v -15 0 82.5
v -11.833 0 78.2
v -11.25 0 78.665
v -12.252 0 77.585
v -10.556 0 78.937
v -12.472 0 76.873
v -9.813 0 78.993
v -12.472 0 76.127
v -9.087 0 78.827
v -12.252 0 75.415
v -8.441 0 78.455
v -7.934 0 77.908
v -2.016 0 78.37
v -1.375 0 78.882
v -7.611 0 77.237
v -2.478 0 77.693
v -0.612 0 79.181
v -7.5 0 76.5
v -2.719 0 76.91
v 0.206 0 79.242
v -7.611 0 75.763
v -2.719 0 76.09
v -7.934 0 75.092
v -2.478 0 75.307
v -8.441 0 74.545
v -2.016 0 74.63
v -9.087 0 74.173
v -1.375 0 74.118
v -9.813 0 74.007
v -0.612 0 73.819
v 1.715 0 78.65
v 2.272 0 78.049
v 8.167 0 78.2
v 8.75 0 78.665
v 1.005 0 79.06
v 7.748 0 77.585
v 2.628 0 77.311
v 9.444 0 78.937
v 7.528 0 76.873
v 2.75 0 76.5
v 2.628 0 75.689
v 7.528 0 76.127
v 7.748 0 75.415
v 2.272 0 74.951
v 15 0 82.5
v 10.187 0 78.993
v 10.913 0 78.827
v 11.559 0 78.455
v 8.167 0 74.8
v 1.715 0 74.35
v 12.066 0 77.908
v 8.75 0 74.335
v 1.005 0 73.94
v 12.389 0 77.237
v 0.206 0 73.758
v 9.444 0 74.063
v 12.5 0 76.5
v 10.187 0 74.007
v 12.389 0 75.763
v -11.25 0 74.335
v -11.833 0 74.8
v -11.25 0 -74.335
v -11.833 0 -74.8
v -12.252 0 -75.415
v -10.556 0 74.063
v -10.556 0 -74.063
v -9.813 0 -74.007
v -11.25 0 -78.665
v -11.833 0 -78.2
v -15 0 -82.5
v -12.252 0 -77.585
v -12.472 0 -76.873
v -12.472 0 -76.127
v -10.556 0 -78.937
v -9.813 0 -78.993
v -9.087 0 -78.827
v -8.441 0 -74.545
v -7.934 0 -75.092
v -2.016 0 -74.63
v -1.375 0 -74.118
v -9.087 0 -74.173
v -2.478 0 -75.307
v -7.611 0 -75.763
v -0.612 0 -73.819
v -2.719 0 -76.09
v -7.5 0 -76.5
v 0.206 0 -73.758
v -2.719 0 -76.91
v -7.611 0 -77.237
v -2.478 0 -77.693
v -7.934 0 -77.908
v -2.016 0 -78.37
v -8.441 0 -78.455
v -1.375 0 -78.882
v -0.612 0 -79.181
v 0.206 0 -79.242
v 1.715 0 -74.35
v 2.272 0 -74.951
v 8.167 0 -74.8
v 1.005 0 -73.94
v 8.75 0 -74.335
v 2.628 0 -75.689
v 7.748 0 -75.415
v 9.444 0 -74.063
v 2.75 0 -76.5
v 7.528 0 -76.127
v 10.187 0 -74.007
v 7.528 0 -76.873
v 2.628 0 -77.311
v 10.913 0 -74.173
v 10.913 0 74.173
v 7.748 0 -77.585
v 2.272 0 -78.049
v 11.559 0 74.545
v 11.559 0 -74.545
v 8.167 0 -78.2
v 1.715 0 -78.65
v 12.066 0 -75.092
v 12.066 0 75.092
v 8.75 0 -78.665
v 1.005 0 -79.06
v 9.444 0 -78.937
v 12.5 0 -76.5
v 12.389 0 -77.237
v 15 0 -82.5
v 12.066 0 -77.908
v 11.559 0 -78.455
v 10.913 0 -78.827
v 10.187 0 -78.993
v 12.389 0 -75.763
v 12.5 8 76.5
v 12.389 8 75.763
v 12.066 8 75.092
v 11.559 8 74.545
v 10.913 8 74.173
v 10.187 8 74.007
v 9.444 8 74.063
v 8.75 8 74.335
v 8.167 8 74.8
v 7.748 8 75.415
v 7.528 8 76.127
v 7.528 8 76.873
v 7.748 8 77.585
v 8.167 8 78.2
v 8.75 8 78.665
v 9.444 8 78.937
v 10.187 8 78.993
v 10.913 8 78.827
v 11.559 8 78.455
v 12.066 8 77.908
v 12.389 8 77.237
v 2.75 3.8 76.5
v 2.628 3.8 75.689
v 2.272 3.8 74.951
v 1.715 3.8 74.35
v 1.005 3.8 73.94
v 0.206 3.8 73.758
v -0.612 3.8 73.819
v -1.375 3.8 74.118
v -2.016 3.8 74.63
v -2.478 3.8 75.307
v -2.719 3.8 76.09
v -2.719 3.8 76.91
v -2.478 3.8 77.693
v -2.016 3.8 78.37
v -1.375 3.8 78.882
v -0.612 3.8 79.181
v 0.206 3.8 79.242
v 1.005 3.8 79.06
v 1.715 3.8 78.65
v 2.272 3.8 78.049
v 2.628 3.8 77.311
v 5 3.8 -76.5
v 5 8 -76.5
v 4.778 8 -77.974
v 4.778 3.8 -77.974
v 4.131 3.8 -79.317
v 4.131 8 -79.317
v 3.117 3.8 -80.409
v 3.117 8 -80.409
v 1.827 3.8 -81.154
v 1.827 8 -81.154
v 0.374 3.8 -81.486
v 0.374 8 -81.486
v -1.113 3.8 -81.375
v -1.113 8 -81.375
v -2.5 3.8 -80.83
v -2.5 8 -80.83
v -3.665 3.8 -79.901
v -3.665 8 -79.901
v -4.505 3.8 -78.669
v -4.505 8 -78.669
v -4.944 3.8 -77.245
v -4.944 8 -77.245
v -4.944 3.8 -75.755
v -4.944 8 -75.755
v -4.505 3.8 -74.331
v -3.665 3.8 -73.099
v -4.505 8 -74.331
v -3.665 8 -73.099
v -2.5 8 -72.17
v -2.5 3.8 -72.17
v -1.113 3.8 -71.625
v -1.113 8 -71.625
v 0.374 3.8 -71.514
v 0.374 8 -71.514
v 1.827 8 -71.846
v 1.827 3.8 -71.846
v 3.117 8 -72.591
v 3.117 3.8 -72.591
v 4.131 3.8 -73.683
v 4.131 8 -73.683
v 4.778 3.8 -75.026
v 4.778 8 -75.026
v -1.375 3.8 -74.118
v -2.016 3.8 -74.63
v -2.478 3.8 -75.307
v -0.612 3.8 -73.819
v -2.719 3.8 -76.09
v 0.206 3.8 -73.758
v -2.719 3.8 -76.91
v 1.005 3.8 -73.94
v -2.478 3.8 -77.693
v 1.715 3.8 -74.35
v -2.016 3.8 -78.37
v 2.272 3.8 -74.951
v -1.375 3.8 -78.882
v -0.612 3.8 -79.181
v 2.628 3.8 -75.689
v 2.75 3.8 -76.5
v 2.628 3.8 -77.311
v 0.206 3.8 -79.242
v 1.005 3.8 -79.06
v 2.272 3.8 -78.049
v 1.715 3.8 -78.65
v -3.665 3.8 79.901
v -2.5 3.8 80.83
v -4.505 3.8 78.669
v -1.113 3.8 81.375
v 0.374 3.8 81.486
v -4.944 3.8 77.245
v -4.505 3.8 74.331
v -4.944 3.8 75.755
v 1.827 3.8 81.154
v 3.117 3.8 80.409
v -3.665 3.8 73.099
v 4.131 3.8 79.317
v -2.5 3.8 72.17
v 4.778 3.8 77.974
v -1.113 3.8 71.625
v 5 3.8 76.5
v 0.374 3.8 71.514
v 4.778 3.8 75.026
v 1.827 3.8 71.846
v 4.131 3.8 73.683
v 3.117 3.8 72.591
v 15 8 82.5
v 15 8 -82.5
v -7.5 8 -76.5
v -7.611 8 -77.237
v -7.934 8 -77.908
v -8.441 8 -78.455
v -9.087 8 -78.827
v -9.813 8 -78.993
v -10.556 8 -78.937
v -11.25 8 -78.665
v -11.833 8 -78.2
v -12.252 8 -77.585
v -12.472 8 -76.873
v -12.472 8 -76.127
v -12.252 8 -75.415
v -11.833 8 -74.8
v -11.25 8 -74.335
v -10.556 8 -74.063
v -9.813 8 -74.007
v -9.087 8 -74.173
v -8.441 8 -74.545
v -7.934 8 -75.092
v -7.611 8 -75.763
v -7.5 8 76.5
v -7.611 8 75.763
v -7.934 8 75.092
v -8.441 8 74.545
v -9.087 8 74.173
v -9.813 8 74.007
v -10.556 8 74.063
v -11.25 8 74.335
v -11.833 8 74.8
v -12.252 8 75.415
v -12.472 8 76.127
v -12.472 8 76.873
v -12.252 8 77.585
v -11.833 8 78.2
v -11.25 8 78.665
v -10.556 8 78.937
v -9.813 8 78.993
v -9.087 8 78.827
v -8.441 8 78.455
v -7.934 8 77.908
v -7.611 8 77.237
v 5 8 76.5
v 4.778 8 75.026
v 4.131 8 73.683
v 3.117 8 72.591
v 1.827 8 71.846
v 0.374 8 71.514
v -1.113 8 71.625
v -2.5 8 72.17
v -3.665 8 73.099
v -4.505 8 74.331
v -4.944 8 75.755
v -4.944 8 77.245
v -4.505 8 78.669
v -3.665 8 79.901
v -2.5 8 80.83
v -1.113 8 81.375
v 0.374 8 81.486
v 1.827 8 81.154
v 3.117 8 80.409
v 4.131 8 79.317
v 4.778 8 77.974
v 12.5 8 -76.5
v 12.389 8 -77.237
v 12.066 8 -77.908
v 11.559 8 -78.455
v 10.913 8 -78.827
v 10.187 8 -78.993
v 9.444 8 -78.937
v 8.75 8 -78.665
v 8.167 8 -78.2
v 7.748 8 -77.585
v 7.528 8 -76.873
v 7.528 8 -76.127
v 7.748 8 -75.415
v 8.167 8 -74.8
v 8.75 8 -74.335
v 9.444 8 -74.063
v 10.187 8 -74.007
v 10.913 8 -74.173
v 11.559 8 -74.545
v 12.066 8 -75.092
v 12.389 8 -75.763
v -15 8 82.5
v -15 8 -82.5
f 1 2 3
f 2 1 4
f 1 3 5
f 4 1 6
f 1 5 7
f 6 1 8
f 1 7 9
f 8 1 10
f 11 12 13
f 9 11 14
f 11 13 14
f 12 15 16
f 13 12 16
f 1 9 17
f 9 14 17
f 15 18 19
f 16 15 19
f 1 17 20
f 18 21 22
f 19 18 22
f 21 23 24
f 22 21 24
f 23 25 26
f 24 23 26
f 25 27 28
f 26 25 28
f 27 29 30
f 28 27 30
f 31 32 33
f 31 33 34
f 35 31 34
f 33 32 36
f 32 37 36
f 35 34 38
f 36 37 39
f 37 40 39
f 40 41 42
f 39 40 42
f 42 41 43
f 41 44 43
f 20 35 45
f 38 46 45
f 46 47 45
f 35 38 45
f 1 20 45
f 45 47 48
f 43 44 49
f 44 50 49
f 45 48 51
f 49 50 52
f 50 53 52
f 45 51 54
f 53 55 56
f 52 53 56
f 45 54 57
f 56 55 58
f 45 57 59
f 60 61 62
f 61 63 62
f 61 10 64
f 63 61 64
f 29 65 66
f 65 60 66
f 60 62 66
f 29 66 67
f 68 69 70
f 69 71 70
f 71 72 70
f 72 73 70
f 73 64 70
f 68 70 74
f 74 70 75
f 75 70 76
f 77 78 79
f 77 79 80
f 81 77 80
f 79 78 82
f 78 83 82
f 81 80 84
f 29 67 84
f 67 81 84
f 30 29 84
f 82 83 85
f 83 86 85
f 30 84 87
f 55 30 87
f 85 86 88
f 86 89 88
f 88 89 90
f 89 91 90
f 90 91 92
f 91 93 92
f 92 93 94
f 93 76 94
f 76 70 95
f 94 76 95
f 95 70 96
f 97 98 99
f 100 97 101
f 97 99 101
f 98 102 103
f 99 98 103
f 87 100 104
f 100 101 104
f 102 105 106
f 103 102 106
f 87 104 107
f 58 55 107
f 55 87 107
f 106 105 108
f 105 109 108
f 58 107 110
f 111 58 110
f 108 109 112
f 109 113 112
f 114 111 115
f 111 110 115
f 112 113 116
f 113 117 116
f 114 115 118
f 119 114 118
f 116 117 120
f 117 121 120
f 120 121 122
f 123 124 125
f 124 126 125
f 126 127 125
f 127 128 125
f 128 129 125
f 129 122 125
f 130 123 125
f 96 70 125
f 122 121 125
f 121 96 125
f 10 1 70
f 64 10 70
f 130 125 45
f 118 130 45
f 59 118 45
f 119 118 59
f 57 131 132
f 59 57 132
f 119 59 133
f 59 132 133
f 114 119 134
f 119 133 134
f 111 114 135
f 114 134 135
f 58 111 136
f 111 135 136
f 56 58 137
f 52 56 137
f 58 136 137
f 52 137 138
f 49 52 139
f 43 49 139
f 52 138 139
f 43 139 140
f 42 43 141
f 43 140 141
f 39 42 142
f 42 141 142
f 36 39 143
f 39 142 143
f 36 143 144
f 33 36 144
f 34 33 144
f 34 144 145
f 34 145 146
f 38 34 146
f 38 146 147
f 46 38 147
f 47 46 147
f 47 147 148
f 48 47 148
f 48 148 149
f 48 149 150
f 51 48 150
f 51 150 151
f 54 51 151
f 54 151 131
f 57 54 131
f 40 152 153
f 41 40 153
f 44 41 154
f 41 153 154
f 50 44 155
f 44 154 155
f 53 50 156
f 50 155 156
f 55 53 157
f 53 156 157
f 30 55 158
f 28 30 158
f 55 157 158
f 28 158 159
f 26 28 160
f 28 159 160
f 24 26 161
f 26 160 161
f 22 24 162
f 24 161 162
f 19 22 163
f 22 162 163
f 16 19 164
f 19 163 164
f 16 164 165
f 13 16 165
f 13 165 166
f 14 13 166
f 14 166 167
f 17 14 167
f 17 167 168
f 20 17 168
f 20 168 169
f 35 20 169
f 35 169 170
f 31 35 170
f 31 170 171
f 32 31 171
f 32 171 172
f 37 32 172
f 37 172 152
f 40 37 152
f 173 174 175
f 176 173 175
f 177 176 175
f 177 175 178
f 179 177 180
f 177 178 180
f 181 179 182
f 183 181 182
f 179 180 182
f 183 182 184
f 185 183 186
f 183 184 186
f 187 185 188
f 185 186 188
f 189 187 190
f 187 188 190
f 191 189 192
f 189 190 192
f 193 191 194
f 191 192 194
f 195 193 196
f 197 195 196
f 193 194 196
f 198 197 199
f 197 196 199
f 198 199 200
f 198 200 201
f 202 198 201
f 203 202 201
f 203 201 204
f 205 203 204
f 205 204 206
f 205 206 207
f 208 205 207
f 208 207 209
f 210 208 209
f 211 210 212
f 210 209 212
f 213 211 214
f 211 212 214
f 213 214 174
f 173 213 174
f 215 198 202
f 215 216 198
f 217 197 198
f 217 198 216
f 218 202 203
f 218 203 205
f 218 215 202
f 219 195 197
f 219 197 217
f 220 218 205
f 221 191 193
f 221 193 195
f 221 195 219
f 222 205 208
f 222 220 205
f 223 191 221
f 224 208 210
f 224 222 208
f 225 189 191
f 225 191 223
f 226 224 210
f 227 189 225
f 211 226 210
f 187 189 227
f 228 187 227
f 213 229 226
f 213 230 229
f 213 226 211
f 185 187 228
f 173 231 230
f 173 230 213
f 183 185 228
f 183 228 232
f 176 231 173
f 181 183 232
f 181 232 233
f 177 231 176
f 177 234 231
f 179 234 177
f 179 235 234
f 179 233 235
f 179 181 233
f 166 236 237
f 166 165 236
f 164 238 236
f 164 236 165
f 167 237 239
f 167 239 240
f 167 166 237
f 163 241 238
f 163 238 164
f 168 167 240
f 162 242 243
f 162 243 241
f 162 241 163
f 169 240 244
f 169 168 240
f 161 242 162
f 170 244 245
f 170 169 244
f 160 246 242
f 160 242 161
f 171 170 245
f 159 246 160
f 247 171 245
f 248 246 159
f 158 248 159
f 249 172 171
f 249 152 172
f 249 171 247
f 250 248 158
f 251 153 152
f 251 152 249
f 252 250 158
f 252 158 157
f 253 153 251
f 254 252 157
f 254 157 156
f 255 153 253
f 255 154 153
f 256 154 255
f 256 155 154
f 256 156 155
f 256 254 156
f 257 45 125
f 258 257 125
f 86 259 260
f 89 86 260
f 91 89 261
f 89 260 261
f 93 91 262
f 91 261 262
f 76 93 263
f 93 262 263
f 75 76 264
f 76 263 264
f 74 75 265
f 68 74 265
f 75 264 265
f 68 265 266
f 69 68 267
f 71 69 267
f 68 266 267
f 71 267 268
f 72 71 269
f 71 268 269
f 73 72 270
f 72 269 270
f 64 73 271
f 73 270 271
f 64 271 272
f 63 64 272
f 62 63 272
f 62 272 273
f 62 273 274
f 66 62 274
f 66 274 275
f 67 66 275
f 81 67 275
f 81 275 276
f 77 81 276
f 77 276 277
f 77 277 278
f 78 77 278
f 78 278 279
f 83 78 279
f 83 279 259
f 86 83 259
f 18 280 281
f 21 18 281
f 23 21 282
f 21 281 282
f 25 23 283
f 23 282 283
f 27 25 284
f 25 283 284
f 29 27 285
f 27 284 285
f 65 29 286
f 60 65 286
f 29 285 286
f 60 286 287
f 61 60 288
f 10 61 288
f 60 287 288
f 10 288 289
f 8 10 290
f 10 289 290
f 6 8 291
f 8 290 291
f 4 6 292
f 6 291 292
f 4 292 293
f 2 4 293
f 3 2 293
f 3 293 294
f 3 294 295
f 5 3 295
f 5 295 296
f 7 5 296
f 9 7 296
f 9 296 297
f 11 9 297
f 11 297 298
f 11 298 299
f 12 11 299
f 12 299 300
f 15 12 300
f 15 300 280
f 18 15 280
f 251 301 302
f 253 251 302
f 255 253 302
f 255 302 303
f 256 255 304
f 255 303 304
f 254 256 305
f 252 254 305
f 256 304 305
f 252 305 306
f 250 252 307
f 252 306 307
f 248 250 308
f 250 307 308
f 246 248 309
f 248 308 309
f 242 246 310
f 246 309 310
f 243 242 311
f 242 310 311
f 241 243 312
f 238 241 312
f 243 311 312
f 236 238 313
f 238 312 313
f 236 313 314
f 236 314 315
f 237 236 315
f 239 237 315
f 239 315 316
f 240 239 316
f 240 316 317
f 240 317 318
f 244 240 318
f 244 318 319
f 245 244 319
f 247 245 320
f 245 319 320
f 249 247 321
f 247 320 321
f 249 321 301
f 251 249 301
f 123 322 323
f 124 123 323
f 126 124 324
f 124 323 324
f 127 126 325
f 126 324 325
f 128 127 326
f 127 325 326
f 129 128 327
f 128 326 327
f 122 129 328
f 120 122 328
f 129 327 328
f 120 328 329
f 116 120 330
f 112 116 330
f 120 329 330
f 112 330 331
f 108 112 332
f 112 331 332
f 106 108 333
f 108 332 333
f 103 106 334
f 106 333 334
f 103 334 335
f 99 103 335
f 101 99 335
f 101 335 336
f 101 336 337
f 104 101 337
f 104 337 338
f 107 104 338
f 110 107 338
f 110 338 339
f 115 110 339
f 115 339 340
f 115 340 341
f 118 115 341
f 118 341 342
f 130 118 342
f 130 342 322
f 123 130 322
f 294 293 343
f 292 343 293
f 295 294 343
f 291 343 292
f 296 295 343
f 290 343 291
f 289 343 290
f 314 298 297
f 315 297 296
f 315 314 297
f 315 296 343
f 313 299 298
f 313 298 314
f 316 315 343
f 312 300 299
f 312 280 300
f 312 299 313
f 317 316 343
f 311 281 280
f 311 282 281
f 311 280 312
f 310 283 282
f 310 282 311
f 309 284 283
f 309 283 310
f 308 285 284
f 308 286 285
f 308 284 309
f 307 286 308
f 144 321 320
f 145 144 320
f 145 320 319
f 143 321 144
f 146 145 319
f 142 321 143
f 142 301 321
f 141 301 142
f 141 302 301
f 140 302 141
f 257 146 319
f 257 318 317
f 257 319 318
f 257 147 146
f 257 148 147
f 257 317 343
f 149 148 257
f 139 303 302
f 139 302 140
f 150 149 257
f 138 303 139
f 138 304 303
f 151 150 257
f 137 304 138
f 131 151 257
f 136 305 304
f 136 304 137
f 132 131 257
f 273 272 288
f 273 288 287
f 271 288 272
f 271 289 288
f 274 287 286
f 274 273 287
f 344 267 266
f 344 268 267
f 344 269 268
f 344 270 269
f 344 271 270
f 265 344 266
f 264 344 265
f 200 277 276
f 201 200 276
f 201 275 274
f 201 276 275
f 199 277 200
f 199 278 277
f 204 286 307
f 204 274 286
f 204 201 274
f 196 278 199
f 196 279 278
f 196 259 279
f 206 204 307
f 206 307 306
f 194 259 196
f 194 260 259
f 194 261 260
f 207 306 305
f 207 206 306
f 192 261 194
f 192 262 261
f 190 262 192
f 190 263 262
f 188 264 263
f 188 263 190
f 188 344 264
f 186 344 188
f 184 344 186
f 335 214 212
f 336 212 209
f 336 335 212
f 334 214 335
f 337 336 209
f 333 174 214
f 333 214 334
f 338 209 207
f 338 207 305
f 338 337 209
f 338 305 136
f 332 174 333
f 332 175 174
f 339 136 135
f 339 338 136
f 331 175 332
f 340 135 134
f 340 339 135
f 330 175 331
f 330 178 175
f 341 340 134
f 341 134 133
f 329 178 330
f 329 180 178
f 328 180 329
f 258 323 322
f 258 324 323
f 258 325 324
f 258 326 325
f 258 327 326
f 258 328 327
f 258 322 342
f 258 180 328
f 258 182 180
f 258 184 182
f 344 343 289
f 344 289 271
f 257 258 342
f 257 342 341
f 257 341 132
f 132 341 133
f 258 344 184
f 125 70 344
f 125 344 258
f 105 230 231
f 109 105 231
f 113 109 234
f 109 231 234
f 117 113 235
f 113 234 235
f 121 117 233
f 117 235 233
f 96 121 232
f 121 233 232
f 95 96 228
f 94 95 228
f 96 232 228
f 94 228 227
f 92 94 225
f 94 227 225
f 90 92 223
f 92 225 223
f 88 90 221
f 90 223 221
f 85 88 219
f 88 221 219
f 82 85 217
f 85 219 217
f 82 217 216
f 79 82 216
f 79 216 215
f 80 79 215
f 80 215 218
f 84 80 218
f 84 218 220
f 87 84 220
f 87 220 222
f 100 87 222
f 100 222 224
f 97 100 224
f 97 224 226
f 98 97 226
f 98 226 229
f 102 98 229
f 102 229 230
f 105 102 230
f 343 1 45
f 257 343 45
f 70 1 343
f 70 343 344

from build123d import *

# Parameters (mm, degrees)
SKETCH2_W           = 30
SKETCH2_H           = 165
BOSS_EXTRUDE1_DEPTH = 8
SKETCH3_R           = 2.75
CUT_EXTRUDE1_DEPTH  = 8
SKETCH4_R           = 5
CUT_EXTRUDE2_DEPTH  = 4.2
SKETCH5_R           = 2.5
CUT_EXTRUDE3_DEPTH  = 41.2


with BuildPart() as part:
    # Sketch2 → Boss-Extrude1 (new body)
    with BuildSketch(Plane(origin=(0, 0, 0), x_dir=(1, 0, 0), z_dir=(0, 1, 0))):
        Rectangle(SKETCH2_W, SKETCH2_H)
    extrude(amount=BOSS_EXTRUDE1_DEPTH)

    # Sketch3 → Cut-Extrude1 (cut)
    with BuildSketch(Plane(origin=(0, 8, 0), x_dir=(1, 0, 0), z_dir=(0, 1, 0))):
        with Locations((0, -76.5)):
            Circle(SKETCH3_R)
        with Locations((0, 76.5)):
            Circle(SKETCH3_R)
    extrude(amount=-CUT_EXTRUDE1_DEPTH, mode=Mode.SUBTRACT)

    # Sketch4 → Cut-Extrude2 (cut)
    with BuildSketch(Plane(origin=(0, 8, 0), x_dir=(1, 0, 0), z_dir=(0, 1, 0))):
        with Locations((0, 76.5)):
            Circle(SKETCH4_R)
        with Locations((0, -76.5)):
            Circle(SKETCH4_R)
    extrude(amount=-CUT_EXTRUDE2_DEPTH, mode=Mode.SUBTRACT)

    # Sketch5 → Cut-Extrude3 (cut)
    with BuildSketch(Plane(origin=(0, 8, 0), x_dir=(1, 0, 0), z_dir=(0, 1, 0))):
        with Locations((-10, 76.5)):
            Circle(SKETCH5_R)
        with Locations((10, 76.5)):
            Circle(SKETCH5_R)
        with Locations((-10, -76.5)):
            Circle(SKETCH5_R)
        with Locations((10, -76.5)):
            Circle(SKETCH5_R)
    extrude(amount=-CUT_EXTRUDE3_DEPTH, mode=Mode.SUBTRACT)


solid = part.part
